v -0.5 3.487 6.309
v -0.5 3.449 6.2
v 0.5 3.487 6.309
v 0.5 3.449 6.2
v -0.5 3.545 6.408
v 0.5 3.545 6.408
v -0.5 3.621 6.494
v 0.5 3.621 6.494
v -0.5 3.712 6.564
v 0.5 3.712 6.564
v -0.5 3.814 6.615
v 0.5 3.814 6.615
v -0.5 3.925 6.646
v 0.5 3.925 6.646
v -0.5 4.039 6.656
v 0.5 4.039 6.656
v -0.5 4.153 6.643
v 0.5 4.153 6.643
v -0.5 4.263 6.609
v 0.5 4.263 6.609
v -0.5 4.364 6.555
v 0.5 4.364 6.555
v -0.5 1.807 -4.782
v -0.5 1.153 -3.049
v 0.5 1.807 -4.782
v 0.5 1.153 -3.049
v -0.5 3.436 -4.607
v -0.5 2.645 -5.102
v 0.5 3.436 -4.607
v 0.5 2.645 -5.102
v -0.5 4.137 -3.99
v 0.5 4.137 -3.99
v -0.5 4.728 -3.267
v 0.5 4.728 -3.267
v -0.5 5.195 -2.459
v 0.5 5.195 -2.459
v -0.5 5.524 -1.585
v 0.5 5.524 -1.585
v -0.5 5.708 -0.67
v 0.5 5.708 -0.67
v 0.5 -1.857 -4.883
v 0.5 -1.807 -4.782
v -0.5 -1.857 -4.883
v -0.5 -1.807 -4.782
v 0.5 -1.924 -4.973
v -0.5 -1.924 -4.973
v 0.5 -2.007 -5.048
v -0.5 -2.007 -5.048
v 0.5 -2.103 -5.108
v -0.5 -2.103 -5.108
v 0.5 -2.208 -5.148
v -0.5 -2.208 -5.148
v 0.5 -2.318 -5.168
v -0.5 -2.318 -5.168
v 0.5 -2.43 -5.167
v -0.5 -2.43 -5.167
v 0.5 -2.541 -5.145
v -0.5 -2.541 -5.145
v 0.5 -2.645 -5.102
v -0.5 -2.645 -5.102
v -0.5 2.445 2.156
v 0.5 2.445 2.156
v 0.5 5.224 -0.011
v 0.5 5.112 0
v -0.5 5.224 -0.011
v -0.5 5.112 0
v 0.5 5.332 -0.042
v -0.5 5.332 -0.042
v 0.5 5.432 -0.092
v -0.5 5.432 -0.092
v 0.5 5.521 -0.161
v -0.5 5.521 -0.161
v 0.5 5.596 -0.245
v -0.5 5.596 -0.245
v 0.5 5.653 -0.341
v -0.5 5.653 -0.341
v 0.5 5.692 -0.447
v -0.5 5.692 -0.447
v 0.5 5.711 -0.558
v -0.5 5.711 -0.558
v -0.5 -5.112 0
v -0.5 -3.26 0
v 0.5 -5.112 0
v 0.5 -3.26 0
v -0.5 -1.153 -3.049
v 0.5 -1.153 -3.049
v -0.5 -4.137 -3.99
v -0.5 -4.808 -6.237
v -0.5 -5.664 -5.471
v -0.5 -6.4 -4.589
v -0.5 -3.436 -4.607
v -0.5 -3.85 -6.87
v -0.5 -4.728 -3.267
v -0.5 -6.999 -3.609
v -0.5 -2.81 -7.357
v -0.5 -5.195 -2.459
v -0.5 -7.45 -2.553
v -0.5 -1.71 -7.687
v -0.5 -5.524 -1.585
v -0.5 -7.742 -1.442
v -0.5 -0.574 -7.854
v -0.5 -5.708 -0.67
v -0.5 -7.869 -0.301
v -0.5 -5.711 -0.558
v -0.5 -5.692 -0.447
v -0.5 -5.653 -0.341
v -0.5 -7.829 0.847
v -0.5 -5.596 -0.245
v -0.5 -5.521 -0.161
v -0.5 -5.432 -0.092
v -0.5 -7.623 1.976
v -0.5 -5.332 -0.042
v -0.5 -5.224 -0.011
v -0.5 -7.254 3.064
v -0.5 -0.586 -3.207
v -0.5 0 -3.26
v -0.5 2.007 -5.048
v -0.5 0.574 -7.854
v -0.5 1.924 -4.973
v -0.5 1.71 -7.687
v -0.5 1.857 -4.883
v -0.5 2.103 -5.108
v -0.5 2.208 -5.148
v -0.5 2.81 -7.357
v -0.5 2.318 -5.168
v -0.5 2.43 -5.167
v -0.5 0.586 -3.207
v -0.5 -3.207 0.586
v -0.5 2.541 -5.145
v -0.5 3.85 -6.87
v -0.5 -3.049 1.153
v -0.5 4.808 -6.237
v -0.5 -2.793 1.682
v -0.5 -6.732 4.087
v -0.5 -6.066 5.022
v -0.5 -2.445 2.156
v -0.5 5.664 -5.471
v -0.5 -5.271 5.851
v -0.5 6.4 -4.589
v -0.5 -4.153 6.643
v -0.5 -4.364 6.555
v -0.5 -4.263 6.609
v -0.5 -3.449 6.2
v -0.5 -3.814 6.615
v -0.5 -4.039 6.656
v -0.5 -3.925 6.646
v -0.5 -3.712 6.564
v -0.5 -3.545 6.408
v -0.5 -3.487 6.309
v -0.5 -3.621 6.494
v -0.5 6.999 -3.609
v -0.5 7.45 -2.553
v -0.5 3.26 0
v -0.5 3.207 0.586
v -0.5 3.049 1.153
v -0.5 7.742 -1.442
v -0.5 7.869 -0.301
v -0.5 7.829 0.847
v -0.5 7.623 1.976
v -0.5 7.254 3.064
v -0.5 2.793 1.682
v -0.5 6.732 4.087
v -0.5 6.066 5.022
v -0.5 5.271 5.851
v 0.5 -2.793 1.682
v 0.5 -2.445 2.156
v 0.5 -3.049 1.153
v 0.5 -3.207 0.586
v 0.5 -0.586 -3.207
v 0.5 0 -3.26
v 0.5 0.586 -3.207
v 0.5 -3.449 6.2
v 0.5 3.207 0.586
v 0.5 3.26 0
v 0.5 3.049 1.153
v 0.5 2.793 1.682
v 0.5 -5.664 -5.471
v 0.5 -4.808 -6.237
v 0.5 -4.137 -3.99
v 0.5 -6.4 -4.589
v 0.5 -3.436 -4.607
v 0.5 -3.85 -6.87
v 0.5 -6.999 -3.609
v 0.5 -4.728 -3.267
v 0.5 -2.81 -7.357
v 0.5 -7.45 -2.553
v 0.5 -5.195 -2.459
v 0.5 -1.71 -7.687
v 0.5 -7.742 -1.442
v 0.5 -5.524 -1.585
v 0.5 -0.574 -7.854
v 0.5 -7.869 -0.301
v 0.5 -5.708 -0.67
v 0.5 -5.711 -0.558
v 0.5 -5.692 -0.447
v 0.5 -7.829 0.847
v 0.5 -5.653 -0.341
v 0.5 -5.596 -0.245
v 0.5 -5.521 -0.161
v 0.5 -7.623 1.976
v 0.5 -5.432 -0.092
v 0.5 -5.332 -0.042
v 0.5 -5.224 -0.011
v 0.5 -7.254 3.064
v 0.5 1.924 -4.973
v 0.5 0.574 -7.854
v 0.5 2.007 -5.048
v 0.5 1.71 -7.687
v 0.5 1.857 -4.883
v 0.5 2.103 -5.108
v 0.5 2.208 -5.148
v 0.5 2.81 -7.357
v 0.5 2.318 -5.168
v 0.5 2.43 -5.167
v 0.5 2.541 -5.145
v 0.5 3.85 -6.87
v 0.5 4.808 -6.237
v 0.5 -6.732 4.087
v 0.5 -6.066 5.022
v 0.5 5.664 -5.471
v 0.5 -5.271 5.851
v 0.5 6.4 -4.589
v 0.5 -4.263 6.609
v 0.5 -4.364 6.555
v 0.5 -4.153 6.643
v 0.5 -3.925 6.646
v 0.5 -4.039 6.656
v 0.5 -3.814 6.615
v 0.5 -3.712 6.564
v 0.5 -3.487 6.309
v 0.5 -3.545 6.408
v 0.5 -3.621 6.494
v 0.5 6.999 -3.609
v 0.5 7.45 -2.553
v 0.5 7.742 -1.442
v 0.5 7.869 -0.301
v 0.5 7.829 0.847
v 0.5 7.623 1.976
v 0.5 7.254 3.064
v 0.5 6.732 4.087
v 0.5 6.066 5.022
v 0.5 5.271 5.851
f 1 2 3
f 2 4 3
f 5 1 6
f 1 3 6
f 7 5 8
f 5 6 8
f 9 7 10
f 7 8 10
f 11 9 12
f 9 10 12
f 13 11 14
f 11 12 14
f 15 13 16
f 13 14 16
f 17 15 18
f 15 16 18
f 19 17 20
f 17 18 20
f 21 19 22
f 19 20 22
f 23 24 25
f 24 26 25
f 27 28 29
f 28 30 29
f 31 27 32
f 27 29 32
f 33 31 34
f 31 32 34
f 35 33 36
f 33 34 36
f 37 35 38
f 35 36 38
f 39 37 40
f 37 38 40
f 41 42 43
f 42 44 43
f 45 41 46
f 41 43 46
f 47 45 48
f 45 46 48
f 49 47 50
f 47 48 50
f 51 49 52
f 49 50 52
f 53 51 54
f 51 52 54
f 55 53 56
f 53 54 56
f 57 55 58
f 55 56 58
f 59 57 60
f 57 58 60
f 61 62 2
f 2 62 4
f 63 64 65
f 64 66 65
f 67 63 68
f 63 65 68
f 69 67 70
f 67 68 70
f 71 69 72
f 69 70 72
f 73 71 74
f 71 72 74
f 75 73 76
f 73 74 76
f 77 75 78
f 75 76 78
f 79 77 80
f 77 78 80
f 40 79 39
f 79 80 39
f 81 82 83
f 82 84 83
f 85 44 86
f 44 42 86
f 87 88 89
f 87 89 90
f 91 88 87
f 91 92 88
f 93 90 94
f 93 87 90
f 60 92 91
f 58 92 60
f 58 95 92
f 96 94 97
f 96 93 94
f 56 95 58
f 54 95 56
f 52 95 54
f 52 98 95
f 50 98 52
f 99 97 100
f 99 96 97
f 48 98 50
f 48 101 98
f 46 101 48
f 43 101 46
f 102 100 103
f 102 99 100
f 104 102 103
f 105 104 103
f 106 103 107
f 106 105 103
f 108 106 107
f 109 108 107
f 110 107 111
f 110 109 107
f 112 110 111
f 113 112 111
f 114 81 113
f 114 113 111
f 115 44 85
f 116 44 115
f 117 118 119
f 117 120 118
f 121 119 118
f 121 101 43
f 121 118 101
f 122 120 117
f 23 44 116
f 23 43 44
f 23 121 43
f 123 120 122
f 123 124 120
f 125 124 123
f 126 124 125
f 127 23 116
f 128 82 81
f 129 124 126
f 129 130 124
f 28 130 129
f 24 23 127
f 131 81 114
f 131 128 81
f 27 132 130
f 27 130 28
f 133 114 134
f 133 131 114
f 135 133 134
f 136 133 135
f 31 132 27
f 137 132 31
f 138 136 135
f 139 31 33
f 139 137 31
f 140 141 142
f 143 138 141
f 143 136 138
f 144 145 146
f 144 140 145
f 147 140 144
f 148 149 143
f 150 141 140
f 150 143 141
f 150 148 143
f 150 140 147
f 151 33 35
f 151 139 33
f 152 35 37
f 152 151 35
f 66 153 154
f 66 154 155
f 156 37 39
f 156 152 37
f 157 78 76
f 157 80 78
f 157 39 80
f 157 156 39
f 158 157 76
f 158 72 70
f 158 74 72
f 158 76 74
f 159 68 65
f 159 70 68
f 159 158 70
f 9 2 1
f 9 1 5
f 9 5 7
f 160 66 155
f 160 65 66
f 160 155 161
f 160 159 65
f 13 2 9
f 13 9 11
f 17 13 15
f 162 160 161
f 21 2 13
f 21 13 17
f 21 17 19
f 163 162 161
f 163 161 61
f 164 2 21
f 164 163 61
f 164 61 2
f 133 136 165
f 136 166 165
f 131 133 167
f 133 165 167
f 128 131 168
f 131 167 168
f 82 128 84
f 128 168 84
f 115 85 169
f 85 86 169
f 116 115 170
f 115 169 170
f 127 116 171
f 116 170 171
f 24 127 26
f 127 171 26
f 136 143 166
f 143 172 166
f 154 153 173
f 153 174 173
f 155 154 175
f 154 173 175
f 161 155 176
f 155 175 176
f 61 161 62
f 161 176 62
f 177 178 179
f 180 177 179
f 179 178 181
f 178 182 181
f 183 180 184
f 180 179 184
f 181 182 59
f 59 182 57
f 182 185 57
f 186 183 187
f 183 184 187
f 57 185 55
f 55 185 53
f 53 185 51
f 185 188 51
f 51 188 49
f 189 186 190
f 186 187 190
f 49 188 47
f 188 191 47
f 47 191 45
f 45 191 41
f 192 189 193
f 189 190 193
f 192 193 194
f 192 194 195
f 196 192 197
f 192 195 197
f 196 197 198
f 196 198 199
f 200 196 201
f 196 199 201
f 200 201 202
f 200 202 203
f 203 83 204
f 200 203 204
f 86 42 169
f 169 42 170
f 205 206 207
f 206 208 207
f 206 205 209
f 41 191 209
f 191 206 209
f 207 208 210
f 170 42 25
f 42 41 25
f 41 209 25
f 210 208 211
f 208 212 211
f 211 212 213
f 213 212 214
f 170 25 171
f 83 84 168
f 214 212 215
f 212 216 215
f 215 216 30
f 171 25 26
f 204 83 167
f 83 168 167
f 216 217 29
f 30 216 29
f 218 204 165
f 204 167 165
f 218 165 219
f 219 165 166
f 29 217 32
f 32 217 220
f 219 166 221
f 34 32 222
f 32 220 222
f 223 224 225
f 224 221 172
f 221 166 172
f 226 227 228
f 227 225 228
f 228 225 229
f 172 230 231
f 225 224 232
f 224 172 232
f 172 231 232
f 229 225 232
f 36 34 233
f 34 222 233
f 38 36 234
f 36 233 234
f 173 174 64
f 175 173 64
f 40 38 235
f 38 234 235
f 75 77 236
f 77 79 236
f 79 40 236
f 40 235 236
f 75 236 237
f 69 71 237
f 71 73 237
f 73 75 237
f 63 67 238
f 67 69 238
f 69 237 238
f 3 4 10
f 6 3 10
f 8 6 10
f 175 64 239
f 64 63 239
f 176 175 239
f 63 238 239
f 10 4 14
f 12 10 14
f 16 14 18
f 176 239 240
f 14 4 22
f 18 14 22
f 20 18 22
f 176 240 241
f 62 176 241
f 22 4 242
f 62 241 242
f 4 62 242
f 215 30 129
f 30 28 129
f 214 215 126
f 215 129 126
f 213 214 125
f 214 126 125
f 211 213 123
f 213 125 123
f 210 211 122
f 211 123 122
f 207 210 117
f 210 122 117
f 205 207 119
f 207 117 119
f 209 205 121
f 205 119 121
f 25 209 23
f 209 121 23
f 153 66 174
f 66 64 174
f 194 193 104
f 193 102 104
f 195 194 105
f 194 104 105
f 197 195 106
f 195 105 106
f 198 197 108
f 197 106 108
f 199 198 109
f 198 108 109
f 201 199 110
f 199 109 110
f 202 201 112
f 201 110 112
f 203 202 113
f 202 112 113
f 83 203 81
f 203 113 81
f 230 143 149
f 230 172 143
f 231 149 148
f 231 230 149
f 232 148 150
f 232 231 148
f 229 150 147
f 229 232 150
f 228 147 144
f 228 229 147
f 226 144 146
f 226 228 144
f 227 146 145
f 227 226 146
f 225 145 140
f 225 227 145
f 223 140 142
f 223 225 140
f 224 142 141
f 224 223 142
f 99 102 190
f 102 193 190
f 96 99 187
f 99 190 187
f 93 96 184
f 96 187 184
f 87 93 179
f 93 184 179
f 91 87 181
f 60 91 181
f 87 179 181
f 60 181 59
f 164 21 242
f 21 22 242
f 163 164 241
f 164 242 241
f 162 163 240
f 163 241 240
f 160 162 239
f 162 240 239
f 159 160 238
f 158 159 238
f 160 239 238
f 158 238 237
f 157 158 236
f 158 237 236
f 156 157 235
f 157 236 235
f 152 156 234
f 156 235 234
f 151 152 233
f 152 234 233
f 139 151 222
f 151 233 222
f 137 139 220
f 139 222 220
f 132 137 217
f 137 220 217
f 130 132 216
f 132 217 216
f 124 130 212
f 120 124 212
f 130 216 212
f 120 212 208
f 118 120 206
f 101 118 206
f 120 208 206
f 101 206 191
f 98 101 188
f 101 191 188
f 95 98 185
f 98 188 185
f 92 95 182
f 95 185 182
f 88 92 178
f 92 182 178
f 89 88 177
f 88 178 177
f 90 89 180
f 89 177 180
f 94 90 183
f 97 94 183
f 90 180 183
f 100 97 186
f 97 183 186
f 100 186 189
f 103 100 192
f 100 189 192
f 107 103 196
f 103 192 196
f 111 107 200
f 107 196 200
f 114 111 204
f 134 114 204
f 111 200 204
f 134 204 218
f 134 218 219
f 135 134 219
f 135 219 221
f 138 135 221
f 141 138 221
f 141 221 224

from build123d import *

# Parameters (mm, degrees)
EXTRUDE1_DEPTH = 0.5
FILLET1_R      = 0.6


with BuildPart() as part:
    # Sketch1 → Extrude1 (new body, symmetric)
    with BuildSketch(Plane(origin=(0, 0, 0), x_dir=(0, 0, -1), z_dir=(1, 0, 0))):
        with BuildLine():
            Line((-6.981705618, -3.642994877), (-2.156287319, -2.445))
            ThreePointArc((-2.156287319, -2.445), (-1.152584053, -3.04945077), (0, -3.26))
            Line((0, -3.26), (0, -5.747096774))
            ThreePointArc((0, -5.747096774), (3.267381482, -4.727931851), (5.375916774, -2.031905551))
            Line((5.375916774, -2.031905551), (3.04945077, -1.152584053))
            ThreePointArc((3.04945077, -1.152584053), (3.26, 0), (3.04945077, 1.152584053))
            Line((3.04945077, 1.152584053), (5.375916774, 2.031905551))
            ThreePointArc((5.375916774, 2.031905551), (3.267381482, 4.727931851), (0, 5.747096774))
            Line((0, 5.747096774), (0, 3.26))
            ThreePointArc((0, 3.26), (-1.152584053, 3.04945077), (-2.156287319, 2.445))
            Line((-2.156287319, 2.445), (-6.981705618, 3.642994877))
            ThreePointArc((-6.981705618, 3.642994877), (7.875, 0), (-6.981705618, -3.642994877))
        make_face()
    extrude(amount=EXTRUDE1_DEPTH, both=True)

    # Fillet1
    fillet1_edges = [part.edges().sort_by_distance(p)[0] for p in [
        (0, -3.642994877, 6.981705618),
        (0, -5.747096774, 0),
        (0, -2.031905551, -5.375916774),
        (0, 2.031905551, -5.375916774),
        (0, 5.747096774, 0),
        (0, 3.642994877, 6.981705618),
    ]]
    fillet(fillet1_edges, radius=FILLET1_R)


solid = part.part
